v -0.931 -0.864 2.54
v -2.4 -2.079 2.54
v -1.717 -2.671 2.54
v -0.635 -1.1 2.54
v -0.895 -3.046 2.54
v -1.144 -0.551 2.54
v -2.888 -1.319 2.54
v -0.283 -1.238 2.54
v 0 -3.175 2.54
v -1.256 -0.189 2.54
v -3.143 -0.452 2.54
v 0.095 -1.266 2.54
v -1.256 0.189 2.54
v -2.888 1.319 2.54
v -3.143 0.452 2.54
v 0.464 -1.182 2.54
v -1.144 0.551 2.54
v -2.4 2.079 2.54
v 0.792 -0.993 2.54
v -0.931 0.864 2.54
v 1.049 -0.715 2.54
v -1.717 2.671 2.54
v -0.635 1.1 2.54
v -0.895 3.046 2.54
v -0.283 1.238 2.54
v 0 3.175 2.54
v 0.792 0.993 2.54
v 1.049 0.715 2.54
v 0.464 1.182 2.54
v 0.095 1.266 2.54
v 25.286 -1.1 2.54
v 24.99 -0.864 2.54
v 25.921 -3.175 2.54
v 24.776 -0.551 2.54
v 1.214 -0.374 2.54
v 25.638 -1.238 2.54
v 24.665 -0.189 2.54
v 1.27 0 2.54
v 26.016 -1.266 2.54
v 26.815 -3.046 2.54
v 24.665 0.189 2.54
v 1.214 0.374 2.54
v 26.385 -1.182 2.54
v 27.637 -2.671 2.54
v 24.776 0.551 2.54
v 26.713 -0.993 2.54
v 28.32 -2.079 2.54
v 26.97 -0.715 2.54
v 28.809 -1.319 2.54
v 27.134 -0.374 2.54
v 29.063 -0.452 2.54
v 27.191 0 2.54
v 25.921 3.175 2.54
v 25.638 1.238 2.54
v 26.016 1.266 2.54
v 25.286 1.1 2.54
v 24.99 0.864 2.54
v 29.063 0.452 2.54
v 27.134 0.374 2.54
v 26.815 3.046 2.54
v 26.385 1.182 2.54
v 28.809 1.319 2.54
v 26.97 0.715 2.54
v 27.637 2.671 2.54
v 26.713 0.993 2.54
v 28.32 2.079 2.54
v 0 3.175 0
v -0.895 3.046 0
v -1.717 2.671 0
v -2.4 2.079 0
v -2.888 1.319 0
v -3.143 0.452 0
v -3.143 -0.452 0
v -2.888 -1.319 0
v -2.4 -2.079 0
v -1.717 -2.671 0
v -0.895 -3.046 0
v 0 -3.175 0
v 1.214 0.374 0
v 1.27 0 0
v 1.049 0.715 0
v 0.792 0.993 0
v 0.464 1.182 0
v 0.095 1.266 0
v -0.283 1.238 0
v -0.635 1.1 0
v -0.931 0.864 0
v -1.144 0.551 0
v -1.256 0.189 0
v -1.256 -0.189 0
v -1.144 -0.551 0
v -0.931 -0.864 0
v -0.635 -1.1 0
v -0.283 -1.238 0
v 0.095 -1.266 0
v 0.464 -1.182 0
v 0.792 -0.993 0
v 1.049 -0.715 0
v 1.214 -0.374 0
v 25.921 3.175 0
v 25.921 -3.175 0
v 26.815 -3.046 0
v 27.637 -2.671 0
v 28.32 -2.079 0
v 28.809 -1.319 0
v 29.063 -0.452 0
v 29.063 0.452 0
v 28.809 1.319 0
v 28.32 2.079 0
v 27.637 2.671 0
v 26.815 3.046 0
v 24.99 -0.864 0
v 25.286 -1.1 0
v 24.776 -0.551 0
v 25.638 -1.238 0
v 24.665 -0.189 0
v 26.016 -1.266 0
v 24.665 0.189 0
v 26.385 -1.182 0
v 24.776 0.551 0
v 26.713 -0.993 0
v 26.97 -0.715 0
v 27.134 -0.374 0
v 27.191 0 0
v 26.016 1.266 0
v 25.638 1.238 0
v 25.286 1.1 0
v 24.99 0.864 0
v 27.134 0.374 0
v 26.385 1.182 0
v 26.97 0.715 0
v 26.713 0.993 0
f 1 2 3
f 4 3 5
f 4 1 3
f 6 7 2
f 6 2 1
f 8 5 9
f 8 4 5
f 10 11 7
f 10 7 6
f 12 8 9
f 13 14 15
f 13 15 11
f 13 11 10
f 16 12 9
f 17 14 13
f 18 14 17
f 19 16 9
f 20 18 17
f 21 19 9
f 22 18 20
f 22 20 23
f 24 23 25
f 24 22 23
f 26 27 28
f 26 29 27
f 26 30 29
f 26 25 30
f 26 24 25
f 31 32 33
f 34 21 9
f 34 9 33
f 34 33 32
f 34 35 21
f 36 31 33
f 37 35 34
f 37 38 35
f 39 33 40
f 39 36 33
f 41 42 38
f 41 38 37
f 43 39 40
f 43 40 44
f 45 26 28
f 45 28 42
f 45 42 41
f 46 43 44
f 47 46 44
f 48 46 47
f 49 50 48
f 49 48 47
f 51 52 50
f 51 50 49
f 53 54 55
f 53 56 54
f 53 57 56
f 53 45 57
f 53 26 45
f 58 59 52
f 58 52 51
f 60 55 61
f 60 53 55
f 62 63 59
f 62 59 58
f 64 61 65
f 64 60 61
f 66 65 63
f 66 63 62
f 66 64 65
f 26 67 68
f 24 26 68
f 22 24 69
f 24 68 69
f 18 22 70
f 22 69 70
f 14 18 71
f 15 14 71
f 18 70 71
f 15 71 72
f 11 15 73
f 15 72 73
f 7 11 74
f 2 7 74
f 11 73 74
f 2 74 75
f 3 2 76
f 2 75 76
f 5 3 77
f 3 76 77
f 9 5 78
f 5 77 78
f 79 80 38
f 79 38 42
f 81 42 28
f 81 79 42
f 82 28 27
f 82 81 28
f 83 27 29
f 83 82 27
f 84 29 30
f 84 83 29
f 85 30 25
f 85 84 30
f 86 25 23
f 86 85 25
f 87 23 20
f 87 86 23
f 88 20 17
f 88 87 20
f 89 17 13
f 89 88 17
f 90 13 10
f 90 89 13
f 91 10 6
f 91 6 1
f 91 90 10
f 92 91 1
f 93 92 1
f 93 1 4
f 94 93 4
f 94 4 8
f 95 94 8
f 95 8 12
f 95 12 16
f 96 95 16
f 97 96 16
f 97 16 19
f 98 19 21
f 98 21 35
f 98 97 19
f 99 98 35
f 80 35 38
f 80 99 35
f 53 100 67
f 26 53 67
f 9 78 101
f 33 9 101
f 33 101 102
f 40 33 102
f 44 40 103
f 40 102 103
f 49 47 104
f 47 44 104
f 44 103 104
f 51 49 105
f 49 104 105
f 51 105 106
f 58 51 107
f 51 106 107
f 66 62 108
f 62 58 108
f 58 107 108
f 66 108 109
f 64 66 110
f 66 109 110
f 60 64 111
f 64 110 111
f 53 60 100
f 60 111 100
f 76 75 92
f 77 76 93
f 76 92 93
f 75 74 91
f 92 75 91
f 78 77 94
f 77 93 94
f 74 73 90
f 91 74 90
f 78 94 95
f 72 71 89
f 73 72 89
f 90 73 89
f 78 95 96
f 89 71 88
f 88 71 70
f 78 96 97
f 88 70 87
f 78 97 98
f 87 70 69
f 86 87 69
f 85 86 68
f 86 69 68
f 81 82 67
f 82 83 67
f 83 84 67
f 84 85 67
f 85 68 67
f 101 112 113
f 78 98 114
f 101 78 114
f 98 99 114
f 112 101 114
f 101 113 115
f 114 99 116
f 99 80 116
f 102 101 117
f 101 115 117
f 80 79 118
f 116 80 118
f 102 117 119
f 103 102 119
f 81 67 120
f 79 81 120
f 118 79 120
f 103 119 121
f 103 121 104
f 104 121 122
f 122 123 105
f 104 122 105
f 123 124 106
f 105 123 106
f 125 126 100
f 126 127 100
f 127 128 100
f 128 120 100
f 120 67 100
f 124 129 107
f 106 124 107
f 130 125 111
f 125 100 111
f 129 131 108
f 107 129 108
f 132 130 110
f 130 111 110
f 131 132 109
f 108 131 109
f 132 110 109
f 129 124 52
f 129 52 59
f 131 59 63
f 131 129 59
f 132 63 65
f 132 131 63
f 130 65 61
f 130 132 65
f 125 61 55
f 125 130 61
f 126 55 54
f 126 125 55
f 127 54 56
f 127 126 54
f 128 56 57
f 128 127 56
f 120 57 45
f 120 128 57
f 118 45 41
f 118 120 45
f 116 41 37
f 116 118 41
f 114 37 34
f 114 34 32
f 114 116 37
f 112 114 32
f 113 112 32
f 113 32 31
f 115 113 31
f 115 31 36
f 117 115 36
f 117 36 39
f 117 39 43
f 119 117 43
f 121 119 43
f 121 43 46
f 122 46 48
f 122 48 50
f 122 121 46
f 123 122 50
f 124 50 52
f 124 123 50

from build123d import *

# Parameters (mm, degrees)
SKETCH1_R           = 3.175
SKETCH1_R_2         = 1.27
BOSS_EXTRUDE2_DEPTH = 2.54


with BuildPart() as part:
    # Sketch1 → Boss-Extrude2 (new body)
    # profile 1 of 3: a face of its own
    with BuildSketch(Plane.XY):
        Circle(SKETCH1_R)
        Circle(SKETCH1_R_2, mode=Mode.SUBTRACT)
    # profile 2 of 3: a face of its own
    with BuildSketch(Plane.XY):
        with Locations((25.9207, 0)):
            Circle(SKETCH1_R)
        with Locations((25.9207, 0)):
            Circle(SKETCH1_R_2, mode=Mode.SUBTRACT)
    # profile 3 of 3: a face of its own
    with BuildSketch(Plane.XY):
        with BuildLine():
            Line((25.9207, 3.175), (0, 3.175))
            ThreePointArc((0, 3.175), (2.24506403, 2.24506403), (3.175, 0))
            ThreePointArc((3.175, 0), (2.24506403, -2.24506403), (0, -3.175))
            Line((0, -3.175), (25.9207, -3.175))
            ThreePointArc((25.9207, -3.175), (22.7457, 0), (25.9207, 3.175))
        make_face()
    extrude(amount=BOSS_EXTRUDE2_DEPTH)


solid = part.part
